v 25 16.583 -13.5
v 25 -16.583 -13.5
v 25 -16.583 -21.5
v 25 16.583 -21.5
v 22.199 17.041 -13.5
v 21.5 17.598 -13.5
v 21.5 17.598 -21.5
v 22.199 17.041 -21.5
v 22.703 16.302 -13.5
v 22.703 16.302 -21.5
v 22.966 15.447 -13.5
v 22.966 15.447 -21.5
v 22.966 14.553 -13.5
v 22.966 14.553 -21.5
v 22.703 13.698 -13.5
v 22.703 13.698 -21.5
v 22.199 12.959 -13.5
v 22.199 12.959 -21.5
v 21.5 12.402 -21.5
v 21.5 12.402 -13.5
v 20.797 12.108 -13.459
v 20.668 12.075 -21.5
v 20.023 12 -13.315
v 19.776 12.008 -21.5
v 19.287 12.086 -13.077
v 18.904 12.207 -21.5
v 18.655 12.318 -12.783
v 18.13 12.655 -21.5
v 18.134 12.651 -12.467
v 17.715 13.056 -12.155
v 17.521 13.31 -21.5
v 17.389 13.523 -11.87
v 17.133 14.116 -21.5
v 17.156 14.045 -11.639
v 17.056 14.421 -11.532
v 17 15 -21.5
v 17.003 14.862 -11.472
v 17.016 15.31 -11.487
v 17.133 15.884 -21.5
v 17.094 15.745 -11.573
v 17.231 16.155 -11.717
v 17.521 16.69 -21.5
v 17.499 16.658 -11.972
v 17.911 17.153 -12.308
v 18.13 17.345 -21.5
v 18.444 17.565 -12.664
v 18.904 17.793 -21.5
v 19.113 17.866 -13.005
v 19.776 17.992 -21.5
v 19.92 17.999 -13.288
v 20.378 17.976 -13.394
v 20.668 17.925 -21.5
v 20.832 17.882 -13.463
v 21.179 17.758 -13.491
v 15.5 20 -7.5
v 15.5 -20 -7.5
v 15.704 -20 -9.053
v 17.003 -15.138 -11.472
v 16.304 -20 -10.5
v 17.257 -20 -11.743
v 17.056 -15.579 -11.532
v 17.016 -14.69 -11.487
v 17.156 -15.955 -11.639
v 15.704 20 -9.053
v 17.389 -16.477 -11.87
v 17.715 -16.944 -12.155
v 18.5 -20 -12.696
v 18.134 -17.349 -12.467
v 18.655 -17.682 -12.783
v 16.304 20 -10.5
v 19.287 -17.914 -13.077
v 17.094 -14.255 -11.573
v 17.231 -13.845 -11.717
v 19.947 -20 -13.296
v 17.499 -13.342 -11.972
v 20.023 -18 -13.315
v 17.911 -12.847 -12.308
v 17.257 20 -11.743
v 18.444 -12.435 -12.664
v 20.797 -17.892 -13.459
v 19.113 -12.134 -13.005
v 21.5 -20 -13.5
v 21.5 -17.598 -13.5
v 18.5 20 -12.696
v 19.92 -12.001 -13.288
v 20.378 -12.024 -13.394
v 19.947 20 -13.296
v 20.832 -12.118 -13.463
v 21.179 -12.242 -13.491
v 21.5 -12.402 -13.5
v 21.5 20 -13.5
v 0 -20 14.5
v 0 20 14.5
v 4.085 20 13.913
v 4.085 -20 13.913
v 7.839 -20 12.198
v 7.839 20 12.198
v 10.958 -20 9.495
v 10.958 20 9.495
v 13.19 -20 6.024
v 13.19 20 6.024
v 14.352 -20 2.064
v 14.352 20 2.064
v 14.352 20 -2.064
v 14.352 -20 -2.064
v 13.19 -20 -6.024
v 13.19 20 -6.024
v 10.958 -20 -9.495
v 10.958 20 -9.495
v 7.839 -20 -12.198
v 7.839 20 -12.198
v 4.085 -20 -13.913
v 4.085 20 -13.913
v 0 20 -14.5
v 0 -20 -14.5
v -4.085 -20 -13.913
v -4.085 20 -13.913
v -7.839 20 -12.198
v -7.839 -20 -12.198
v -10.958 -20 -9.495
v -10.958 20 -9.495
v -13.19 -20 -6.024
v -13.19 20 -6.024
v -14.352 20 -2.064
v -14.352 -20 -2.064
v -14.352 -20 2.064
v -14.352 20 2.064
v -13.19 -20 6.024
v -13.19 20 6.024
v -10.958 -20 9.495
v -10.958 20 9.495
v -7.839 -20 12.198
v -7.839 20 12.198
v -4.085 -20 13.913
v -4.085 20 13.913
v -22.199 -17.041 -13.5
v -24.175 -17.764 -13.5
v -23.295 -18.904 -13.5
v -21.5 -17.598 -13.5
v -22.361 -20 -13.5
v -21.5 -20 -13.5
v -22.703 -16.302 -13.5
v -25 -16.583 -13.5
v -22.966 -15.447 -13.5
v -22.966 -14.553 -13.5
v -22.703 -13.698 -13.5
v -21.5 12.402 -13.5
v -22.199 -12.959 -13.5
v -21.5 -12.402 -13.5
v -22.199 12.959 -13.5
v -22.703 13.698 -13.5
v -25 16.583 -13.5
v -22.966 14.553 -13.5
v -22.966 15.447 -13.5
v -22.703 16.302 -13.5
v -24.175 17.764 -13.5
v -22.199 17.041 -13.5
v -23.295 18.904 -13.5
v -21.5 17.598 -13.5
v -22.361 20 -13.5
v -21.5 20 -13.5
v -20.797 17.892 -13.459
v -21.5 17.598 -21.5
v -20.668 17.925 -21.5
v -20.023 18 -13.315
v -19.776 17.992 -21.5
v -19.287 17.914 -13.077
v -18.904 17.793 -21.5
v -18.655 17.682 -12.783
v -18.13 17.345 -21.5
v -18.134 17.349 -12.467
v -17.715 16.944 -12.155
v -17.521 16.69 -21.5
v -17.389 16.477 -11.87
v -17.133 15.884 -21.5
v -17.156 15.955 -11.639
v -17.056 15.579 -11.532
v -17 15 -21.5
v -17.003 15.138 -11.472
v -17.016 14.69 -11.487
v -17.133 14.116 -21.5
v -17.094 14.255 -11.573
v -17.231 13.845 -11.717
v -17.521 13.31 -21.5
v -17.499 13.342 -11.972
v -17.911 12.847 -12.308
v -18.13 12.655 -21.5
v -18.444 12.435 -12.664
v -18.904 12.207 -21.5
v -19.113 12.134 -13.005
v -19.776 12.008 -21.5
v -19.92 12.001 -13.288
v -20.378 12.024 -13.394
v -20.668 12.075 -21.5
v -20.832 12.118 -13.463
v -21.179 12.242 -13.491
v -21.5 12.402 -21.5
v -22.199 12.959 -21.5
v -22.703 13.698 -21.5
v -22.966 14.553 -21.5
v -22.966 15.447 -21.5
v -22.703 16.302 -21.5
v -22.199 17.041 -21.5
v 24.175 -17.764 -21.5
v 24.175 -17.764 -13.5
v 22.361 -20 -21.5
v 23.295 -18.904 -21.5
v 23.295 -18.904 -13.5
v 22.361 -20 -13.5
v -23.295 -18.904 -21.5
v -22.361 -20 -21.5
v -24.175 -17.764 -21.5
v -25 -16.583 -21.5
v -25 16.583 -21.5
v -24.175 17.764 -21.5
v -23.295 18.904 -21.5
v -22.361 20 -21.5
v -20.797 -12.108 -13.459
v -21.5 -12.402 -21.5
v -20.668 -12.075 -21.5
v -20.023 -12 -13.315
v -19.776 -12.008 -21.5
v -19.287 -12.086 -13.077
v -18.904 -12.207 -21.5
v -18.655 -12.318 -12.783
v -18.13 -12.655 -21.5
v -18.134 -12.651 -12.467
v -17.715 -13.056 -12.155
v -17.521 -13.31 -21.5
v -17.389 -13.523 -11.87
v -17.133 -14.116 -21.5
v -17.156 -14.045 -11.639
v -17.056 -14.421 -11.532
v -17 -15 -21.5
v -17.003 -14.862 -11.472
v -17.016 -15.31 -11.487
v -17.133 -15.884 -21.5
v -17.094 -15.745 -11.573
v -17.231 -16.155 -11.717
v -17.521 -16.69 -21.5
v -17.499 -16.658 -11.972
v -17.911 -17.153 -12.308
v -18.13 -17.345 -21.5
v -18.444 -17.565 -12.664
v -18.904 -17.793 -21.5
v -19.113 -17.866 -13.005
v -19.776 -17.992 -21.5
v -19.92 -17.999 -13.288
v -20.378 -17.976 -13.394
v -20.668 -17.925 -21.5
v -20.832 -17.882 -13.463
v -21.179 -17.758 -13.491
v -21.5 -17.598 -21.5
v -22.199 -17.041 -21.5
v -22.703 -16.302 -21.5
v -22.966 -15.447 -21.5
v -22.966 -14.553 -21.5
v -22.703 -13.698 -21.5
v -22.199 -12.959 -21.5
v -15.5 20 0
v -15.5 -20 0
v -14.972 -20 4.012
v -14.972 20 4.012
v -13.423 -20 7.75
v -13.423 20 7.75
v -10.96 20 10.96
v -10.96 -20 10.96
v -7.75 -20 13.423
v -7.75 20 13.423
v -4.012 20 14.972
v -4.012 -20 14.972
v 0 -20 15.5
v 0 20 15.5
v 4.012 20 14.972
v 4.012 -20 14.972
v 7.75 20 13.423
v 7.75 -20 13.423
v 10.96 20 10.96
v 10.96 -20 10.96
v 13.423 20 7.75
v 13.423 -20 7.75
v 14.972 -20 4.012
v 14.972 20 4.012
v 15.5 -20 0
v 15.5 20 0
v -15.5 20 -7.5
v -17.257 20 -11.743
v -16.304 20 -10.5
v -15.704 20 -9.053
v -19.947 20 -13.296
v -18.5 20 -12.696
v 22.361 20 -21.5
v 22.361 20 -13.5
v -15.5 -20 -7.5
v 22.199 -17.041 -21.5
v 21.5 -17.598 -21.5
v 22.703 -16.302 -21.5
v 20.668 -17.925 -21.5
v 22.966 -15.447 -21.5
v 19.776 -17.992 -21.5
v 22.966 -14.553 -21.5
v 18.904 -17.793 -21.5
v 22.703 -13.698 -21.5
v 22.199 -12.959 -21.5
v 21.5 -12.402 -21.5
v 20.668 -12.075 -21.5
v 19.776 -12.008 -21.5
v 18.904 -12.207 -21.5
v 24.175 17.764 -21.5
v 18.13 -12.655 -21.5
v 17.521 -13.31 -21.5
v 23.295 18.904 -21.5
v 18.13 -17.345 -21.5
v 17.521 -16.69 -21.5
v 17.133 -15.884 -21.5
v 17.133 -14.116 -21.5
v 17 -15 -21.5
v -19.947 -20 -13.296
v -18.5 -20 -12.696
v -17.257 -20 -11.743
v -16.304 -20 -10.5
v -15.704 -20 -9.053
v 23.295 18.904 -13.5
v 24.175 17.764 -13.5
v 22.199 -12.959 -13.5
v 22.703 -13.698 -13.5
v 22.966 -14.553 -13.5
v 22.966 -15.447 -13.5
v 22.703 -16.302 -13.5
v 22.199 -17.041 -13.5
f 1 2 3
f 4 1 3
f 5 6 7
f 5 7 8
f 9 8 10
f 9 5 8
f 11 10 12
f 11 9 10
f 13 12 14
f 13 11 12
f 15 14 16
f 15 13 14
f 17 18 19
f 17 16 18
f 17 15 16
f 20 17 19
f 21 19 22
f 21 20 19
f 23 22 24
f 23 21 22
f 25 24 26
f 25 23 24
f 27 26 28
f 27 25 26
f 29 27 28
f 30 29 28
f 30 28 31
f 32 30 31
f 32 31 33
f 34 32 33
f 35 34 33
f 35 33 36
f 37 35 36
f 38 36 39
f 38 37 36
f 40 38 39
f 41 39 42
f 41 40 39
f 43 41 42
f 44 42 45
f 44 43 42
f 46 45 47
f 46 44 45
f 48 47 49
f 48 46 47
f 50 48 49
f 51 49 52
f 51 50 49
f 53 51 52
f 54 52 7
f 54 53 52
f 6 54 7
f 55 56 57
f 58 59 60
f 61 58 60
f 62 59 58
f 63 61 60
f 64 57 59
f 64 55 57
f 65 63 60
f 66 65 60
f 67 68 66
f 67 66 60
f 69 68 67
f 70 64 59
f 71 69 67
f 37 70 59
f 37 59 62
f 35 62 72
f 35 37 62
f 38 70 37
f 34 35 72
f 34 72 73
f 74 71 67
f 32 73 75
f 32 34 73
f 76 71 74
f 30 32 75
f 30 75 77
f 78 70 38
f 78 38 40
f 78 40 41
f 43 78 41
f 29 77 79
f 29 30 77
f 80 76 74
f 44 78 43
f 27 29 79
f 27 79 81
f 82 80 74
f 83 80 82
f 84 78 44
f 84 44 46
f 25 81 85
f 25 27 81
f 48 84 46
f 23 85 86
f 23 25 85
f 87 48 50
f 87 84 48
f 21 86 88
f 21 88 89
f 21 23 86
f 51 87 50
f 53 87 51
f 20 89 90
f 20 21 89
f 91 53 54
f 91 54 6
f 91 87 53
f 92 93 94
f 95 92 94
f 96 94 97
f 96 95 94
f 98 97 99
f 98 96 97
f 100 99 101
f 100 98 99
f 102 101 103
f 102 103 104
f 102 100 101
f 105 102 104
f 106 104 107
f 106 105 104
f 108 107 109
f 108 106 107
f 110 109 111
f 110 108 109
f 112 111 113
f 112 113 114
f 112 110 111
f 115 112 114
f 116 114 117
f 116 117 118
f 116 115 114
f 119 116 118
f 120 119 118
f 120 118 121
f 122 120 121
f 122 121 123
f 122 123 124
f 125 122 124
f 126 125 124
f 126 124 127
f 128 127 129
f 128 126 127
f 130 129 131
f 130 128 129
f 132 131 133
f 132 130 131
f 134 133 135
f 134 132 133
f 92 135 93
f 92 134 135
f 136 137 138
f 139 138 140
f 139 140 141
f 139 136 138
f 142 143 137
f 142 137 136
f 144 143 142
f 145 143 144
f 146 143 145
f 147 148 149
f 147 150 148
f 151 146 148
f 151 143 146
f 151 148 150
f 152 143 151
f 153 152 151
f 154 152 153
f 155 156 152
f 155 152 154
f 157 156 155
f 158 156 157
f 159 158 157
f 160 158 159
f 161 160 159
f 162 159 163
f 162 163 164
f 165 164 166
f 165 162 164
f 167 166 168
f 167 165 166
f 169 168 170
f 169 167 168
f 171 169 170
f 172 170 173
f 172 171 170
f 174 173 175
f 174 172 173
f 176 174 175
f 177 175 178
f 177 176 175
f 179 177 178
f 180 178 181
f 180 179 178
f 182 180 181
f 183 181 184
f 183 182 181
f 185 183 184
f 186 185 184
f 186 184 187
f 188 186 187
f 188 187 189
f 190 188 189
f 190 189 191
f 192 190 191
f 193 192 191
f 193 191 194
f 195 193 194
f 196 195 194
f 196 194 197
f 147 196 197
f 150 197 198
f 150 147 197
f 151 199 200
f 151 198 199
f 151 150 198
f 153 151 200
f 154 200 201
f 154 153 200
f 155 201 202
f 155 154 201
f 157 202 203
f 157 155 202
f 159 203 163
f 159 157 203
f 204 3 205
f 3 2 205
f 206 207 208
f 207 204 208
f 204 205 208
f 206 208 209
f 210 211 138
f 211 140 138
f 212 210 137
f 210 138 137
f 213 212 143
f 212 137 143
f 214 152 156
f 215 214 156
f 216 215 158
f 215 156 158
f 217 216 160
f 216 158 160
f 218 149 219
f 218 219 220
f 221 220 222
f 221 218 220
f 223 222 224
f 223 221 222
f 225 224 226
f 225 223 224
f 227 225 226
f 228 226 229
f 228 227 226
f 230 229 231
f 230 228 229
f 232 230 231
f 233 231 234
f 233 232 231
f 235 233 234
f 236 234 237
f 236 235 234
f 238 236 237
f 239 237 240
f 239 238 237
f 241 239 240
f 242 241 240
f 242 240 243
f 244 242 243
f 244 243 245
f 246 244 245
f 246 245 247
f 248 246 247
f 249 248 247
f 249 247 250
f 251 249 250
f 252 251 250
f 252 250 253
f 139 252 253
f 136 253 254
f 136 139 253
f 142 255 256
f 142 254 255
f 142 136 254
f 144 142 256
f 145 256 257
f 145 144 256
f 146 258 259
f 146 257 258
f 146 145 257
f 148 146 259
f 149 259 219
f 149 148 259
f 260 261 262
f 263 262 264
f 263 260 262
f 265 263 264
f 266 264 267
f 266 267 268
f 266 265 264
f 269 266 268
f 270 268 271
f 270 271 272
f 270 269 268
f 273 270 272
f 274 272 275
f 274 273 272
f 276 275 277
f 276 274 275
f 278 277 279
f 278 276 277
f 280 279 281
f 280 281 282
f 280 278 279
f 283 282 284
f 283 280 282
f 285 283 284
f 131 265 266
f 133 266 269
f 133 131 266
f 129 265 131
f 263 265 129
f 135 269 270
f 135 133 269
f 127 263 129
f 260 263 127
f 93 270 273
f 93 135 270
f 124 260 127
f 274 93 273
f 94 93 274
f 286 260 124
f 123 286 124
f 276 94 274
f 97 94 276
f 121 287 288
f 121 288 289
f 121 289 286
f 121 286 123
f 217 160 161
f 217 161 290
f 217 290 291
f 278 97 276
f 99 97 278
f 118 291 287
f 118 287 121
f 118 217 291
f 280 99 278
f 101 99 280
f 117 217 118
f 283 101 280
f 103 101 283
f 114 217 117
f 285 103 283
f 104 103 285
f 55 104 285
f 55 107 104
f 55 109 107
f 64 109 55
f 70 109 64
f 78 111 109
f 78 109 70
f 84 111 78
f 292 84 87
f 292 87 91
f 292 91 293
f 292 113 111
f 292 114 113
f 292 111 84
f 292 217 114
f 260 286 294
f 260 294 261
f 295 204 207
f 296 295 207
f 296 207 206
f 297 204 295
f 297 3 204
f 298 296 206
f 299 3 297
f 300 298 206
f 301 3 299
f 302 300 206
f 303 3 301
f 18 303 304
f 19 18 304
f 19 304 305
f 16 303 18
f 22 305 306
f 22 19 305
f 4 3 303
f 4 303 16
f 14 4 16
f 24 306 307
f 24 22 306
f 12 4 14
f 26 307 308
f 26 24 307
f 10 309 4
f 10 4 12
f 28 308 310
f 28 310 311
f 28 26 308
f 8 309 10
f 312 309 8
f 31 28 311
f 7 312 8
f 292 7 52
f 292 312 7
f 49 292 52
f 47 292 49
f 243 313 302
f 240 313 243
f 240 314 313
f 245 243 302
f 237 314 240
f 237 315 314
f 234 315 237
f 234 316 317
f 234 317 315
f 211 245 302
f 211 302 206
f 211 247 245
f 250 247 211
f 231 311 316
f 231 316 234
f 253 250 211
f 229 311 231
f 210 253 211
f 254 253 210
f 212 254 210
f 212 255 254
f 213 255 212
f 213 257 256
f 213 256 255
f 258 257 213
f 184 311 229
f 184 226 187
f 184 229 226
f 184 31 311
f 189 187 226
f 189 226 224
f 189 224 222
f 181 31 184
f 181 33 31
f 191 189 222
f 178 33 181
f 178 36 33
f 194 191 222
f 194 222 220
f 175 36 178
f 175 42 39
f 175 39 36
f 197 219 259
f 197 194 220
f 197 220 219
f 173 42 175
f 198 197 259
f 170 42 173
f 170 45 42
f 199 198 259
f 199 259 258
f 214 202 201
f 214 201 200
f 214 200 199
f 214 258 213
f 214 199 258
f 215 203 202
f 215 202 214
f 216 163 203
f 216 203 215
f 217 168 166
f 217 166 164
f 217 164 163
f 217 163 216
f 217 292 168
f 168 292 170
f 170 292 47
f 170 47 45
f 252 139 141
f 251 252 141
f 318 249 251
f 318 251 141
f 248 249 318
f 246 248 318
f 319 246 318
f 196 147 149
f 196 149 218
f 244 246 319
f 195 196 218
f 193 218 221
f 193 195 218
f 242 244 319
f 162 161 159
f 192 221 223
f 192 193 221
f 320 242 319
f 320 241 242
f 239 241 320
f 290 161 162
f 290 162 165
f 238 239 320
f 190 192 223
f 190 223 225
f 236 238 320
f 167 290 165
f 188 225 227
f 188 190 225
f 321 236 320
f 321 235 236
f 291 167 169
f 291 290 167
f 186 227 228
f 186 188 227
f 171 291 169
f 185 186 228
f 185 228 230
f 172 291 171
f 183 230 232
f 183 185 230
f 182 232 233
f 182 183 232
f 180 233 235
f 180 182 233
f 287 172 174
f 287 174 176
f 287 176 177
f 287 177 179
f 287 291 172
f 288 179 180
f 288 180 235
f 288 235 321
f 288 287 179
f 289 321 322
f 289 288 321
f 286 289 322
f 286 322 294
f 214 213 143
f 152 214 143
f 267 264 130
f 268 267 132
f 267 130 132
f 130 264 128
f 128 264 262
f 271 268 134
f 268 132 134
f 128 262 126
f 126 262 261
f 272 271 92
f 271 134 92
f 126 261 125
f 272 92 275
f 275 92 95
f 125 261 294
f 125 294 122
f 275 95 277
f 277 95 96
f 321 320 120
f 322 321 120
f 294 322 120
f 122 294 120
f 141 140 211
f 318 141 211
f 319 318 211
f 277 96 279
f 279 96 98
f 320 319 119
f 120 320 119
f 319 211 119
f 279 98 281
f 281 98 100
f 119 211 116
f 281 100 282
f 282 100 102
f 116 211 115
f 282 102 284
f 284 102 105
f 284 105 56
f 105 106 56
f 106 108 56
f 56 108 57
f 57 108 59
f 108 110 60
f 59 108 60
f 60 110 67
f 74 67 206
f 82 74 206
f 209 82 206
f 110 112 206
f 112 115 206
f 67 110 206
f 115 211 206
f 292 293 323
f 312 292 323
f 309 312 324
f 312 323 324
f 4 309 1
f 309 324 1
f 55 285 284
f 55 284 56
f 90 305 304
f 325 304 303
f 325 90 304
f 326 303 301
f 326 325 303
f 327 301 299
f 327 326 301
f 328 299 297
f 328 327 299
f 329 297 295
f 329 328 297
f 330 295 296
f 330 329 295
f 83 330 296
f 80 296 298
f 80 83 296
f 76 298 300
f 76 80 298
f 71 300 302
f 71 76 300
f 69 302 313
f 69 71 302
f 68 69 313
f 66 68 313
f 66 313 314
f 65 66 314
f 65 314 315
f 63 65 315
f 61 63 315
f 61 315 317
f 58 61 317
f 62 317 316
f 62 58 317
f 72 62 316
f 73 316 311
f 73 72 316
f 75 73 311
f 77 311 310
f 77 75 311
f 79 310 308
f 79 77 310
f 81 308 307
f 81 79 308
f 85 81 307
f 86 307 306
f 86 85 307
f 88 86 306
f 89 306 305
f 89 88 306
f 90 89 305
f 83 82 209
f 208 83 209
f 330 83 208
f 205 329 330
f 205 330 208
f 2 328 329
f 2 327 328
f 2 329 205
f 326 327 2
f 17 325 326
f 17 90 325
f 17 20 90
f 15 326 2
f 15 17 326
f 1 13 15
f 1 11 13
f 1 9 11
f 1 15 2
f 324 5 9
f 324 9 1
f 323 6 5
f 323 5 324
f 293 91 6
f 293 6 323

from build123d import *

# Parameters (mm, degrees)
SKETCH1_R                    = 14.5
BOSS_EXTRUDE1_DEPTH          = 20
CUT_EXTRUDE1_DEPTH           = 49.928519291
CUT_EXTRUDE1_DEPTH_BACK      = 49.928519291
SKETCH2_R                    = 3
CUT_EXTRUDE_THIN1_DEPTH      = 49.928519332
CUT_EXTRUDE_THIN1_DEPTH_BACK = 49.928519332
SKETCH5_R                    = 40
SKETCH5_R_2                  = 30


with BuildPart() as part:
    # Sketch1 → Boss-Extrude1 (new, symmetric)
    with BuildSketch(Plane(origin=(0, 0, 0), x_dir=(1, 0, 0), z_dir=(0, 1, 0))):
        with BuildLine():
            Line((-25, 21.5), (-25, 13.5))
            Line((-25, 13.5), (-21.5, 13.5))
            ThreePointArc((-21.5, 13.5), (-17.257359313, 11.742640687), (-15.5, 7.5))
            Line((-15.5, 7.5), (-15.5, 0))
            ThreePointArc((-15.5, 0), (0, -15.5), (15.5, 0))
            Line((15.5, 0), (15.5, 7.5))
            ThreePointArc((15.5, 7.5), (17.257359313, 11.742640687), (21.5, 13.5))
            Line((21.5, 13.5), (25, 13.5))
            Line((25, 13.5), (25, 21.5))
            Line((25, 21.5), (-25, 21.5))
        make_face()
        with Locations(Location((0, 0, 0), (0, 0, 270))):
            Circle(SKETCH1_R, mode=Mode.SUBTRACT)
    extrude(amount=BOSS_EXTRUDE1_DEPTH, both=True)

    # Sketch2 → Cut-Extrude1 (cut, two sides: drawn at the far end of the back side and taken through both)
    with BuildSketch(Plane(origin=(0, 0, -21.5), x_dir=(-1, 0, 0), z_dir=(0, 0, -1)).offset(-CUT_EXTRUDE1_DEPTH_BACK)):
        with Locations(Location((-20, 15, 0), (0, 0, 120))):
            Circle(SKETCH2_R)
        with Locations(Location((20, 15, 0), (0, 0, 60))):
            Circle(SKETCH2_R)
        with Locations(Location((20, -15, 0), (0, 0, 60))):
            Circle(SKETCH2_R)
        with Locations(Location((-20, -15, 0), (0, 0, 120))):
            Circle(SKETCH2_R)
    extrude(amount=CUT_EXTRUDE1_DEPTH + CUT_EXTRUDE1_DEPTH_BACK, mode=Mode.SUBTRACT)

    # Sketch5 → Cut-Extrude-Thin1 (cut, two sides: drawn at the far end of the back side and taken through both)
    with BuildSketch(Plane(origin=(0, 0, -21.5), x_dir=(-1, 0, 0), z_dir=(0, 0, -1)).offset(-CUT_EXTRUDE_THIN1_DEPTH_BACK)):
        Circle(SKETCH5_R)
        Circle(SKETCH5_R_2, mode=Mode.SUBTRACT)
    extrude(amount=CUT_EXTRUDE_THIN1_DEPTH + CUT_EXTRUDE_THIN1_DEPTH_BACK, mode=Mode.SUBTRACT)


solid = part.part
